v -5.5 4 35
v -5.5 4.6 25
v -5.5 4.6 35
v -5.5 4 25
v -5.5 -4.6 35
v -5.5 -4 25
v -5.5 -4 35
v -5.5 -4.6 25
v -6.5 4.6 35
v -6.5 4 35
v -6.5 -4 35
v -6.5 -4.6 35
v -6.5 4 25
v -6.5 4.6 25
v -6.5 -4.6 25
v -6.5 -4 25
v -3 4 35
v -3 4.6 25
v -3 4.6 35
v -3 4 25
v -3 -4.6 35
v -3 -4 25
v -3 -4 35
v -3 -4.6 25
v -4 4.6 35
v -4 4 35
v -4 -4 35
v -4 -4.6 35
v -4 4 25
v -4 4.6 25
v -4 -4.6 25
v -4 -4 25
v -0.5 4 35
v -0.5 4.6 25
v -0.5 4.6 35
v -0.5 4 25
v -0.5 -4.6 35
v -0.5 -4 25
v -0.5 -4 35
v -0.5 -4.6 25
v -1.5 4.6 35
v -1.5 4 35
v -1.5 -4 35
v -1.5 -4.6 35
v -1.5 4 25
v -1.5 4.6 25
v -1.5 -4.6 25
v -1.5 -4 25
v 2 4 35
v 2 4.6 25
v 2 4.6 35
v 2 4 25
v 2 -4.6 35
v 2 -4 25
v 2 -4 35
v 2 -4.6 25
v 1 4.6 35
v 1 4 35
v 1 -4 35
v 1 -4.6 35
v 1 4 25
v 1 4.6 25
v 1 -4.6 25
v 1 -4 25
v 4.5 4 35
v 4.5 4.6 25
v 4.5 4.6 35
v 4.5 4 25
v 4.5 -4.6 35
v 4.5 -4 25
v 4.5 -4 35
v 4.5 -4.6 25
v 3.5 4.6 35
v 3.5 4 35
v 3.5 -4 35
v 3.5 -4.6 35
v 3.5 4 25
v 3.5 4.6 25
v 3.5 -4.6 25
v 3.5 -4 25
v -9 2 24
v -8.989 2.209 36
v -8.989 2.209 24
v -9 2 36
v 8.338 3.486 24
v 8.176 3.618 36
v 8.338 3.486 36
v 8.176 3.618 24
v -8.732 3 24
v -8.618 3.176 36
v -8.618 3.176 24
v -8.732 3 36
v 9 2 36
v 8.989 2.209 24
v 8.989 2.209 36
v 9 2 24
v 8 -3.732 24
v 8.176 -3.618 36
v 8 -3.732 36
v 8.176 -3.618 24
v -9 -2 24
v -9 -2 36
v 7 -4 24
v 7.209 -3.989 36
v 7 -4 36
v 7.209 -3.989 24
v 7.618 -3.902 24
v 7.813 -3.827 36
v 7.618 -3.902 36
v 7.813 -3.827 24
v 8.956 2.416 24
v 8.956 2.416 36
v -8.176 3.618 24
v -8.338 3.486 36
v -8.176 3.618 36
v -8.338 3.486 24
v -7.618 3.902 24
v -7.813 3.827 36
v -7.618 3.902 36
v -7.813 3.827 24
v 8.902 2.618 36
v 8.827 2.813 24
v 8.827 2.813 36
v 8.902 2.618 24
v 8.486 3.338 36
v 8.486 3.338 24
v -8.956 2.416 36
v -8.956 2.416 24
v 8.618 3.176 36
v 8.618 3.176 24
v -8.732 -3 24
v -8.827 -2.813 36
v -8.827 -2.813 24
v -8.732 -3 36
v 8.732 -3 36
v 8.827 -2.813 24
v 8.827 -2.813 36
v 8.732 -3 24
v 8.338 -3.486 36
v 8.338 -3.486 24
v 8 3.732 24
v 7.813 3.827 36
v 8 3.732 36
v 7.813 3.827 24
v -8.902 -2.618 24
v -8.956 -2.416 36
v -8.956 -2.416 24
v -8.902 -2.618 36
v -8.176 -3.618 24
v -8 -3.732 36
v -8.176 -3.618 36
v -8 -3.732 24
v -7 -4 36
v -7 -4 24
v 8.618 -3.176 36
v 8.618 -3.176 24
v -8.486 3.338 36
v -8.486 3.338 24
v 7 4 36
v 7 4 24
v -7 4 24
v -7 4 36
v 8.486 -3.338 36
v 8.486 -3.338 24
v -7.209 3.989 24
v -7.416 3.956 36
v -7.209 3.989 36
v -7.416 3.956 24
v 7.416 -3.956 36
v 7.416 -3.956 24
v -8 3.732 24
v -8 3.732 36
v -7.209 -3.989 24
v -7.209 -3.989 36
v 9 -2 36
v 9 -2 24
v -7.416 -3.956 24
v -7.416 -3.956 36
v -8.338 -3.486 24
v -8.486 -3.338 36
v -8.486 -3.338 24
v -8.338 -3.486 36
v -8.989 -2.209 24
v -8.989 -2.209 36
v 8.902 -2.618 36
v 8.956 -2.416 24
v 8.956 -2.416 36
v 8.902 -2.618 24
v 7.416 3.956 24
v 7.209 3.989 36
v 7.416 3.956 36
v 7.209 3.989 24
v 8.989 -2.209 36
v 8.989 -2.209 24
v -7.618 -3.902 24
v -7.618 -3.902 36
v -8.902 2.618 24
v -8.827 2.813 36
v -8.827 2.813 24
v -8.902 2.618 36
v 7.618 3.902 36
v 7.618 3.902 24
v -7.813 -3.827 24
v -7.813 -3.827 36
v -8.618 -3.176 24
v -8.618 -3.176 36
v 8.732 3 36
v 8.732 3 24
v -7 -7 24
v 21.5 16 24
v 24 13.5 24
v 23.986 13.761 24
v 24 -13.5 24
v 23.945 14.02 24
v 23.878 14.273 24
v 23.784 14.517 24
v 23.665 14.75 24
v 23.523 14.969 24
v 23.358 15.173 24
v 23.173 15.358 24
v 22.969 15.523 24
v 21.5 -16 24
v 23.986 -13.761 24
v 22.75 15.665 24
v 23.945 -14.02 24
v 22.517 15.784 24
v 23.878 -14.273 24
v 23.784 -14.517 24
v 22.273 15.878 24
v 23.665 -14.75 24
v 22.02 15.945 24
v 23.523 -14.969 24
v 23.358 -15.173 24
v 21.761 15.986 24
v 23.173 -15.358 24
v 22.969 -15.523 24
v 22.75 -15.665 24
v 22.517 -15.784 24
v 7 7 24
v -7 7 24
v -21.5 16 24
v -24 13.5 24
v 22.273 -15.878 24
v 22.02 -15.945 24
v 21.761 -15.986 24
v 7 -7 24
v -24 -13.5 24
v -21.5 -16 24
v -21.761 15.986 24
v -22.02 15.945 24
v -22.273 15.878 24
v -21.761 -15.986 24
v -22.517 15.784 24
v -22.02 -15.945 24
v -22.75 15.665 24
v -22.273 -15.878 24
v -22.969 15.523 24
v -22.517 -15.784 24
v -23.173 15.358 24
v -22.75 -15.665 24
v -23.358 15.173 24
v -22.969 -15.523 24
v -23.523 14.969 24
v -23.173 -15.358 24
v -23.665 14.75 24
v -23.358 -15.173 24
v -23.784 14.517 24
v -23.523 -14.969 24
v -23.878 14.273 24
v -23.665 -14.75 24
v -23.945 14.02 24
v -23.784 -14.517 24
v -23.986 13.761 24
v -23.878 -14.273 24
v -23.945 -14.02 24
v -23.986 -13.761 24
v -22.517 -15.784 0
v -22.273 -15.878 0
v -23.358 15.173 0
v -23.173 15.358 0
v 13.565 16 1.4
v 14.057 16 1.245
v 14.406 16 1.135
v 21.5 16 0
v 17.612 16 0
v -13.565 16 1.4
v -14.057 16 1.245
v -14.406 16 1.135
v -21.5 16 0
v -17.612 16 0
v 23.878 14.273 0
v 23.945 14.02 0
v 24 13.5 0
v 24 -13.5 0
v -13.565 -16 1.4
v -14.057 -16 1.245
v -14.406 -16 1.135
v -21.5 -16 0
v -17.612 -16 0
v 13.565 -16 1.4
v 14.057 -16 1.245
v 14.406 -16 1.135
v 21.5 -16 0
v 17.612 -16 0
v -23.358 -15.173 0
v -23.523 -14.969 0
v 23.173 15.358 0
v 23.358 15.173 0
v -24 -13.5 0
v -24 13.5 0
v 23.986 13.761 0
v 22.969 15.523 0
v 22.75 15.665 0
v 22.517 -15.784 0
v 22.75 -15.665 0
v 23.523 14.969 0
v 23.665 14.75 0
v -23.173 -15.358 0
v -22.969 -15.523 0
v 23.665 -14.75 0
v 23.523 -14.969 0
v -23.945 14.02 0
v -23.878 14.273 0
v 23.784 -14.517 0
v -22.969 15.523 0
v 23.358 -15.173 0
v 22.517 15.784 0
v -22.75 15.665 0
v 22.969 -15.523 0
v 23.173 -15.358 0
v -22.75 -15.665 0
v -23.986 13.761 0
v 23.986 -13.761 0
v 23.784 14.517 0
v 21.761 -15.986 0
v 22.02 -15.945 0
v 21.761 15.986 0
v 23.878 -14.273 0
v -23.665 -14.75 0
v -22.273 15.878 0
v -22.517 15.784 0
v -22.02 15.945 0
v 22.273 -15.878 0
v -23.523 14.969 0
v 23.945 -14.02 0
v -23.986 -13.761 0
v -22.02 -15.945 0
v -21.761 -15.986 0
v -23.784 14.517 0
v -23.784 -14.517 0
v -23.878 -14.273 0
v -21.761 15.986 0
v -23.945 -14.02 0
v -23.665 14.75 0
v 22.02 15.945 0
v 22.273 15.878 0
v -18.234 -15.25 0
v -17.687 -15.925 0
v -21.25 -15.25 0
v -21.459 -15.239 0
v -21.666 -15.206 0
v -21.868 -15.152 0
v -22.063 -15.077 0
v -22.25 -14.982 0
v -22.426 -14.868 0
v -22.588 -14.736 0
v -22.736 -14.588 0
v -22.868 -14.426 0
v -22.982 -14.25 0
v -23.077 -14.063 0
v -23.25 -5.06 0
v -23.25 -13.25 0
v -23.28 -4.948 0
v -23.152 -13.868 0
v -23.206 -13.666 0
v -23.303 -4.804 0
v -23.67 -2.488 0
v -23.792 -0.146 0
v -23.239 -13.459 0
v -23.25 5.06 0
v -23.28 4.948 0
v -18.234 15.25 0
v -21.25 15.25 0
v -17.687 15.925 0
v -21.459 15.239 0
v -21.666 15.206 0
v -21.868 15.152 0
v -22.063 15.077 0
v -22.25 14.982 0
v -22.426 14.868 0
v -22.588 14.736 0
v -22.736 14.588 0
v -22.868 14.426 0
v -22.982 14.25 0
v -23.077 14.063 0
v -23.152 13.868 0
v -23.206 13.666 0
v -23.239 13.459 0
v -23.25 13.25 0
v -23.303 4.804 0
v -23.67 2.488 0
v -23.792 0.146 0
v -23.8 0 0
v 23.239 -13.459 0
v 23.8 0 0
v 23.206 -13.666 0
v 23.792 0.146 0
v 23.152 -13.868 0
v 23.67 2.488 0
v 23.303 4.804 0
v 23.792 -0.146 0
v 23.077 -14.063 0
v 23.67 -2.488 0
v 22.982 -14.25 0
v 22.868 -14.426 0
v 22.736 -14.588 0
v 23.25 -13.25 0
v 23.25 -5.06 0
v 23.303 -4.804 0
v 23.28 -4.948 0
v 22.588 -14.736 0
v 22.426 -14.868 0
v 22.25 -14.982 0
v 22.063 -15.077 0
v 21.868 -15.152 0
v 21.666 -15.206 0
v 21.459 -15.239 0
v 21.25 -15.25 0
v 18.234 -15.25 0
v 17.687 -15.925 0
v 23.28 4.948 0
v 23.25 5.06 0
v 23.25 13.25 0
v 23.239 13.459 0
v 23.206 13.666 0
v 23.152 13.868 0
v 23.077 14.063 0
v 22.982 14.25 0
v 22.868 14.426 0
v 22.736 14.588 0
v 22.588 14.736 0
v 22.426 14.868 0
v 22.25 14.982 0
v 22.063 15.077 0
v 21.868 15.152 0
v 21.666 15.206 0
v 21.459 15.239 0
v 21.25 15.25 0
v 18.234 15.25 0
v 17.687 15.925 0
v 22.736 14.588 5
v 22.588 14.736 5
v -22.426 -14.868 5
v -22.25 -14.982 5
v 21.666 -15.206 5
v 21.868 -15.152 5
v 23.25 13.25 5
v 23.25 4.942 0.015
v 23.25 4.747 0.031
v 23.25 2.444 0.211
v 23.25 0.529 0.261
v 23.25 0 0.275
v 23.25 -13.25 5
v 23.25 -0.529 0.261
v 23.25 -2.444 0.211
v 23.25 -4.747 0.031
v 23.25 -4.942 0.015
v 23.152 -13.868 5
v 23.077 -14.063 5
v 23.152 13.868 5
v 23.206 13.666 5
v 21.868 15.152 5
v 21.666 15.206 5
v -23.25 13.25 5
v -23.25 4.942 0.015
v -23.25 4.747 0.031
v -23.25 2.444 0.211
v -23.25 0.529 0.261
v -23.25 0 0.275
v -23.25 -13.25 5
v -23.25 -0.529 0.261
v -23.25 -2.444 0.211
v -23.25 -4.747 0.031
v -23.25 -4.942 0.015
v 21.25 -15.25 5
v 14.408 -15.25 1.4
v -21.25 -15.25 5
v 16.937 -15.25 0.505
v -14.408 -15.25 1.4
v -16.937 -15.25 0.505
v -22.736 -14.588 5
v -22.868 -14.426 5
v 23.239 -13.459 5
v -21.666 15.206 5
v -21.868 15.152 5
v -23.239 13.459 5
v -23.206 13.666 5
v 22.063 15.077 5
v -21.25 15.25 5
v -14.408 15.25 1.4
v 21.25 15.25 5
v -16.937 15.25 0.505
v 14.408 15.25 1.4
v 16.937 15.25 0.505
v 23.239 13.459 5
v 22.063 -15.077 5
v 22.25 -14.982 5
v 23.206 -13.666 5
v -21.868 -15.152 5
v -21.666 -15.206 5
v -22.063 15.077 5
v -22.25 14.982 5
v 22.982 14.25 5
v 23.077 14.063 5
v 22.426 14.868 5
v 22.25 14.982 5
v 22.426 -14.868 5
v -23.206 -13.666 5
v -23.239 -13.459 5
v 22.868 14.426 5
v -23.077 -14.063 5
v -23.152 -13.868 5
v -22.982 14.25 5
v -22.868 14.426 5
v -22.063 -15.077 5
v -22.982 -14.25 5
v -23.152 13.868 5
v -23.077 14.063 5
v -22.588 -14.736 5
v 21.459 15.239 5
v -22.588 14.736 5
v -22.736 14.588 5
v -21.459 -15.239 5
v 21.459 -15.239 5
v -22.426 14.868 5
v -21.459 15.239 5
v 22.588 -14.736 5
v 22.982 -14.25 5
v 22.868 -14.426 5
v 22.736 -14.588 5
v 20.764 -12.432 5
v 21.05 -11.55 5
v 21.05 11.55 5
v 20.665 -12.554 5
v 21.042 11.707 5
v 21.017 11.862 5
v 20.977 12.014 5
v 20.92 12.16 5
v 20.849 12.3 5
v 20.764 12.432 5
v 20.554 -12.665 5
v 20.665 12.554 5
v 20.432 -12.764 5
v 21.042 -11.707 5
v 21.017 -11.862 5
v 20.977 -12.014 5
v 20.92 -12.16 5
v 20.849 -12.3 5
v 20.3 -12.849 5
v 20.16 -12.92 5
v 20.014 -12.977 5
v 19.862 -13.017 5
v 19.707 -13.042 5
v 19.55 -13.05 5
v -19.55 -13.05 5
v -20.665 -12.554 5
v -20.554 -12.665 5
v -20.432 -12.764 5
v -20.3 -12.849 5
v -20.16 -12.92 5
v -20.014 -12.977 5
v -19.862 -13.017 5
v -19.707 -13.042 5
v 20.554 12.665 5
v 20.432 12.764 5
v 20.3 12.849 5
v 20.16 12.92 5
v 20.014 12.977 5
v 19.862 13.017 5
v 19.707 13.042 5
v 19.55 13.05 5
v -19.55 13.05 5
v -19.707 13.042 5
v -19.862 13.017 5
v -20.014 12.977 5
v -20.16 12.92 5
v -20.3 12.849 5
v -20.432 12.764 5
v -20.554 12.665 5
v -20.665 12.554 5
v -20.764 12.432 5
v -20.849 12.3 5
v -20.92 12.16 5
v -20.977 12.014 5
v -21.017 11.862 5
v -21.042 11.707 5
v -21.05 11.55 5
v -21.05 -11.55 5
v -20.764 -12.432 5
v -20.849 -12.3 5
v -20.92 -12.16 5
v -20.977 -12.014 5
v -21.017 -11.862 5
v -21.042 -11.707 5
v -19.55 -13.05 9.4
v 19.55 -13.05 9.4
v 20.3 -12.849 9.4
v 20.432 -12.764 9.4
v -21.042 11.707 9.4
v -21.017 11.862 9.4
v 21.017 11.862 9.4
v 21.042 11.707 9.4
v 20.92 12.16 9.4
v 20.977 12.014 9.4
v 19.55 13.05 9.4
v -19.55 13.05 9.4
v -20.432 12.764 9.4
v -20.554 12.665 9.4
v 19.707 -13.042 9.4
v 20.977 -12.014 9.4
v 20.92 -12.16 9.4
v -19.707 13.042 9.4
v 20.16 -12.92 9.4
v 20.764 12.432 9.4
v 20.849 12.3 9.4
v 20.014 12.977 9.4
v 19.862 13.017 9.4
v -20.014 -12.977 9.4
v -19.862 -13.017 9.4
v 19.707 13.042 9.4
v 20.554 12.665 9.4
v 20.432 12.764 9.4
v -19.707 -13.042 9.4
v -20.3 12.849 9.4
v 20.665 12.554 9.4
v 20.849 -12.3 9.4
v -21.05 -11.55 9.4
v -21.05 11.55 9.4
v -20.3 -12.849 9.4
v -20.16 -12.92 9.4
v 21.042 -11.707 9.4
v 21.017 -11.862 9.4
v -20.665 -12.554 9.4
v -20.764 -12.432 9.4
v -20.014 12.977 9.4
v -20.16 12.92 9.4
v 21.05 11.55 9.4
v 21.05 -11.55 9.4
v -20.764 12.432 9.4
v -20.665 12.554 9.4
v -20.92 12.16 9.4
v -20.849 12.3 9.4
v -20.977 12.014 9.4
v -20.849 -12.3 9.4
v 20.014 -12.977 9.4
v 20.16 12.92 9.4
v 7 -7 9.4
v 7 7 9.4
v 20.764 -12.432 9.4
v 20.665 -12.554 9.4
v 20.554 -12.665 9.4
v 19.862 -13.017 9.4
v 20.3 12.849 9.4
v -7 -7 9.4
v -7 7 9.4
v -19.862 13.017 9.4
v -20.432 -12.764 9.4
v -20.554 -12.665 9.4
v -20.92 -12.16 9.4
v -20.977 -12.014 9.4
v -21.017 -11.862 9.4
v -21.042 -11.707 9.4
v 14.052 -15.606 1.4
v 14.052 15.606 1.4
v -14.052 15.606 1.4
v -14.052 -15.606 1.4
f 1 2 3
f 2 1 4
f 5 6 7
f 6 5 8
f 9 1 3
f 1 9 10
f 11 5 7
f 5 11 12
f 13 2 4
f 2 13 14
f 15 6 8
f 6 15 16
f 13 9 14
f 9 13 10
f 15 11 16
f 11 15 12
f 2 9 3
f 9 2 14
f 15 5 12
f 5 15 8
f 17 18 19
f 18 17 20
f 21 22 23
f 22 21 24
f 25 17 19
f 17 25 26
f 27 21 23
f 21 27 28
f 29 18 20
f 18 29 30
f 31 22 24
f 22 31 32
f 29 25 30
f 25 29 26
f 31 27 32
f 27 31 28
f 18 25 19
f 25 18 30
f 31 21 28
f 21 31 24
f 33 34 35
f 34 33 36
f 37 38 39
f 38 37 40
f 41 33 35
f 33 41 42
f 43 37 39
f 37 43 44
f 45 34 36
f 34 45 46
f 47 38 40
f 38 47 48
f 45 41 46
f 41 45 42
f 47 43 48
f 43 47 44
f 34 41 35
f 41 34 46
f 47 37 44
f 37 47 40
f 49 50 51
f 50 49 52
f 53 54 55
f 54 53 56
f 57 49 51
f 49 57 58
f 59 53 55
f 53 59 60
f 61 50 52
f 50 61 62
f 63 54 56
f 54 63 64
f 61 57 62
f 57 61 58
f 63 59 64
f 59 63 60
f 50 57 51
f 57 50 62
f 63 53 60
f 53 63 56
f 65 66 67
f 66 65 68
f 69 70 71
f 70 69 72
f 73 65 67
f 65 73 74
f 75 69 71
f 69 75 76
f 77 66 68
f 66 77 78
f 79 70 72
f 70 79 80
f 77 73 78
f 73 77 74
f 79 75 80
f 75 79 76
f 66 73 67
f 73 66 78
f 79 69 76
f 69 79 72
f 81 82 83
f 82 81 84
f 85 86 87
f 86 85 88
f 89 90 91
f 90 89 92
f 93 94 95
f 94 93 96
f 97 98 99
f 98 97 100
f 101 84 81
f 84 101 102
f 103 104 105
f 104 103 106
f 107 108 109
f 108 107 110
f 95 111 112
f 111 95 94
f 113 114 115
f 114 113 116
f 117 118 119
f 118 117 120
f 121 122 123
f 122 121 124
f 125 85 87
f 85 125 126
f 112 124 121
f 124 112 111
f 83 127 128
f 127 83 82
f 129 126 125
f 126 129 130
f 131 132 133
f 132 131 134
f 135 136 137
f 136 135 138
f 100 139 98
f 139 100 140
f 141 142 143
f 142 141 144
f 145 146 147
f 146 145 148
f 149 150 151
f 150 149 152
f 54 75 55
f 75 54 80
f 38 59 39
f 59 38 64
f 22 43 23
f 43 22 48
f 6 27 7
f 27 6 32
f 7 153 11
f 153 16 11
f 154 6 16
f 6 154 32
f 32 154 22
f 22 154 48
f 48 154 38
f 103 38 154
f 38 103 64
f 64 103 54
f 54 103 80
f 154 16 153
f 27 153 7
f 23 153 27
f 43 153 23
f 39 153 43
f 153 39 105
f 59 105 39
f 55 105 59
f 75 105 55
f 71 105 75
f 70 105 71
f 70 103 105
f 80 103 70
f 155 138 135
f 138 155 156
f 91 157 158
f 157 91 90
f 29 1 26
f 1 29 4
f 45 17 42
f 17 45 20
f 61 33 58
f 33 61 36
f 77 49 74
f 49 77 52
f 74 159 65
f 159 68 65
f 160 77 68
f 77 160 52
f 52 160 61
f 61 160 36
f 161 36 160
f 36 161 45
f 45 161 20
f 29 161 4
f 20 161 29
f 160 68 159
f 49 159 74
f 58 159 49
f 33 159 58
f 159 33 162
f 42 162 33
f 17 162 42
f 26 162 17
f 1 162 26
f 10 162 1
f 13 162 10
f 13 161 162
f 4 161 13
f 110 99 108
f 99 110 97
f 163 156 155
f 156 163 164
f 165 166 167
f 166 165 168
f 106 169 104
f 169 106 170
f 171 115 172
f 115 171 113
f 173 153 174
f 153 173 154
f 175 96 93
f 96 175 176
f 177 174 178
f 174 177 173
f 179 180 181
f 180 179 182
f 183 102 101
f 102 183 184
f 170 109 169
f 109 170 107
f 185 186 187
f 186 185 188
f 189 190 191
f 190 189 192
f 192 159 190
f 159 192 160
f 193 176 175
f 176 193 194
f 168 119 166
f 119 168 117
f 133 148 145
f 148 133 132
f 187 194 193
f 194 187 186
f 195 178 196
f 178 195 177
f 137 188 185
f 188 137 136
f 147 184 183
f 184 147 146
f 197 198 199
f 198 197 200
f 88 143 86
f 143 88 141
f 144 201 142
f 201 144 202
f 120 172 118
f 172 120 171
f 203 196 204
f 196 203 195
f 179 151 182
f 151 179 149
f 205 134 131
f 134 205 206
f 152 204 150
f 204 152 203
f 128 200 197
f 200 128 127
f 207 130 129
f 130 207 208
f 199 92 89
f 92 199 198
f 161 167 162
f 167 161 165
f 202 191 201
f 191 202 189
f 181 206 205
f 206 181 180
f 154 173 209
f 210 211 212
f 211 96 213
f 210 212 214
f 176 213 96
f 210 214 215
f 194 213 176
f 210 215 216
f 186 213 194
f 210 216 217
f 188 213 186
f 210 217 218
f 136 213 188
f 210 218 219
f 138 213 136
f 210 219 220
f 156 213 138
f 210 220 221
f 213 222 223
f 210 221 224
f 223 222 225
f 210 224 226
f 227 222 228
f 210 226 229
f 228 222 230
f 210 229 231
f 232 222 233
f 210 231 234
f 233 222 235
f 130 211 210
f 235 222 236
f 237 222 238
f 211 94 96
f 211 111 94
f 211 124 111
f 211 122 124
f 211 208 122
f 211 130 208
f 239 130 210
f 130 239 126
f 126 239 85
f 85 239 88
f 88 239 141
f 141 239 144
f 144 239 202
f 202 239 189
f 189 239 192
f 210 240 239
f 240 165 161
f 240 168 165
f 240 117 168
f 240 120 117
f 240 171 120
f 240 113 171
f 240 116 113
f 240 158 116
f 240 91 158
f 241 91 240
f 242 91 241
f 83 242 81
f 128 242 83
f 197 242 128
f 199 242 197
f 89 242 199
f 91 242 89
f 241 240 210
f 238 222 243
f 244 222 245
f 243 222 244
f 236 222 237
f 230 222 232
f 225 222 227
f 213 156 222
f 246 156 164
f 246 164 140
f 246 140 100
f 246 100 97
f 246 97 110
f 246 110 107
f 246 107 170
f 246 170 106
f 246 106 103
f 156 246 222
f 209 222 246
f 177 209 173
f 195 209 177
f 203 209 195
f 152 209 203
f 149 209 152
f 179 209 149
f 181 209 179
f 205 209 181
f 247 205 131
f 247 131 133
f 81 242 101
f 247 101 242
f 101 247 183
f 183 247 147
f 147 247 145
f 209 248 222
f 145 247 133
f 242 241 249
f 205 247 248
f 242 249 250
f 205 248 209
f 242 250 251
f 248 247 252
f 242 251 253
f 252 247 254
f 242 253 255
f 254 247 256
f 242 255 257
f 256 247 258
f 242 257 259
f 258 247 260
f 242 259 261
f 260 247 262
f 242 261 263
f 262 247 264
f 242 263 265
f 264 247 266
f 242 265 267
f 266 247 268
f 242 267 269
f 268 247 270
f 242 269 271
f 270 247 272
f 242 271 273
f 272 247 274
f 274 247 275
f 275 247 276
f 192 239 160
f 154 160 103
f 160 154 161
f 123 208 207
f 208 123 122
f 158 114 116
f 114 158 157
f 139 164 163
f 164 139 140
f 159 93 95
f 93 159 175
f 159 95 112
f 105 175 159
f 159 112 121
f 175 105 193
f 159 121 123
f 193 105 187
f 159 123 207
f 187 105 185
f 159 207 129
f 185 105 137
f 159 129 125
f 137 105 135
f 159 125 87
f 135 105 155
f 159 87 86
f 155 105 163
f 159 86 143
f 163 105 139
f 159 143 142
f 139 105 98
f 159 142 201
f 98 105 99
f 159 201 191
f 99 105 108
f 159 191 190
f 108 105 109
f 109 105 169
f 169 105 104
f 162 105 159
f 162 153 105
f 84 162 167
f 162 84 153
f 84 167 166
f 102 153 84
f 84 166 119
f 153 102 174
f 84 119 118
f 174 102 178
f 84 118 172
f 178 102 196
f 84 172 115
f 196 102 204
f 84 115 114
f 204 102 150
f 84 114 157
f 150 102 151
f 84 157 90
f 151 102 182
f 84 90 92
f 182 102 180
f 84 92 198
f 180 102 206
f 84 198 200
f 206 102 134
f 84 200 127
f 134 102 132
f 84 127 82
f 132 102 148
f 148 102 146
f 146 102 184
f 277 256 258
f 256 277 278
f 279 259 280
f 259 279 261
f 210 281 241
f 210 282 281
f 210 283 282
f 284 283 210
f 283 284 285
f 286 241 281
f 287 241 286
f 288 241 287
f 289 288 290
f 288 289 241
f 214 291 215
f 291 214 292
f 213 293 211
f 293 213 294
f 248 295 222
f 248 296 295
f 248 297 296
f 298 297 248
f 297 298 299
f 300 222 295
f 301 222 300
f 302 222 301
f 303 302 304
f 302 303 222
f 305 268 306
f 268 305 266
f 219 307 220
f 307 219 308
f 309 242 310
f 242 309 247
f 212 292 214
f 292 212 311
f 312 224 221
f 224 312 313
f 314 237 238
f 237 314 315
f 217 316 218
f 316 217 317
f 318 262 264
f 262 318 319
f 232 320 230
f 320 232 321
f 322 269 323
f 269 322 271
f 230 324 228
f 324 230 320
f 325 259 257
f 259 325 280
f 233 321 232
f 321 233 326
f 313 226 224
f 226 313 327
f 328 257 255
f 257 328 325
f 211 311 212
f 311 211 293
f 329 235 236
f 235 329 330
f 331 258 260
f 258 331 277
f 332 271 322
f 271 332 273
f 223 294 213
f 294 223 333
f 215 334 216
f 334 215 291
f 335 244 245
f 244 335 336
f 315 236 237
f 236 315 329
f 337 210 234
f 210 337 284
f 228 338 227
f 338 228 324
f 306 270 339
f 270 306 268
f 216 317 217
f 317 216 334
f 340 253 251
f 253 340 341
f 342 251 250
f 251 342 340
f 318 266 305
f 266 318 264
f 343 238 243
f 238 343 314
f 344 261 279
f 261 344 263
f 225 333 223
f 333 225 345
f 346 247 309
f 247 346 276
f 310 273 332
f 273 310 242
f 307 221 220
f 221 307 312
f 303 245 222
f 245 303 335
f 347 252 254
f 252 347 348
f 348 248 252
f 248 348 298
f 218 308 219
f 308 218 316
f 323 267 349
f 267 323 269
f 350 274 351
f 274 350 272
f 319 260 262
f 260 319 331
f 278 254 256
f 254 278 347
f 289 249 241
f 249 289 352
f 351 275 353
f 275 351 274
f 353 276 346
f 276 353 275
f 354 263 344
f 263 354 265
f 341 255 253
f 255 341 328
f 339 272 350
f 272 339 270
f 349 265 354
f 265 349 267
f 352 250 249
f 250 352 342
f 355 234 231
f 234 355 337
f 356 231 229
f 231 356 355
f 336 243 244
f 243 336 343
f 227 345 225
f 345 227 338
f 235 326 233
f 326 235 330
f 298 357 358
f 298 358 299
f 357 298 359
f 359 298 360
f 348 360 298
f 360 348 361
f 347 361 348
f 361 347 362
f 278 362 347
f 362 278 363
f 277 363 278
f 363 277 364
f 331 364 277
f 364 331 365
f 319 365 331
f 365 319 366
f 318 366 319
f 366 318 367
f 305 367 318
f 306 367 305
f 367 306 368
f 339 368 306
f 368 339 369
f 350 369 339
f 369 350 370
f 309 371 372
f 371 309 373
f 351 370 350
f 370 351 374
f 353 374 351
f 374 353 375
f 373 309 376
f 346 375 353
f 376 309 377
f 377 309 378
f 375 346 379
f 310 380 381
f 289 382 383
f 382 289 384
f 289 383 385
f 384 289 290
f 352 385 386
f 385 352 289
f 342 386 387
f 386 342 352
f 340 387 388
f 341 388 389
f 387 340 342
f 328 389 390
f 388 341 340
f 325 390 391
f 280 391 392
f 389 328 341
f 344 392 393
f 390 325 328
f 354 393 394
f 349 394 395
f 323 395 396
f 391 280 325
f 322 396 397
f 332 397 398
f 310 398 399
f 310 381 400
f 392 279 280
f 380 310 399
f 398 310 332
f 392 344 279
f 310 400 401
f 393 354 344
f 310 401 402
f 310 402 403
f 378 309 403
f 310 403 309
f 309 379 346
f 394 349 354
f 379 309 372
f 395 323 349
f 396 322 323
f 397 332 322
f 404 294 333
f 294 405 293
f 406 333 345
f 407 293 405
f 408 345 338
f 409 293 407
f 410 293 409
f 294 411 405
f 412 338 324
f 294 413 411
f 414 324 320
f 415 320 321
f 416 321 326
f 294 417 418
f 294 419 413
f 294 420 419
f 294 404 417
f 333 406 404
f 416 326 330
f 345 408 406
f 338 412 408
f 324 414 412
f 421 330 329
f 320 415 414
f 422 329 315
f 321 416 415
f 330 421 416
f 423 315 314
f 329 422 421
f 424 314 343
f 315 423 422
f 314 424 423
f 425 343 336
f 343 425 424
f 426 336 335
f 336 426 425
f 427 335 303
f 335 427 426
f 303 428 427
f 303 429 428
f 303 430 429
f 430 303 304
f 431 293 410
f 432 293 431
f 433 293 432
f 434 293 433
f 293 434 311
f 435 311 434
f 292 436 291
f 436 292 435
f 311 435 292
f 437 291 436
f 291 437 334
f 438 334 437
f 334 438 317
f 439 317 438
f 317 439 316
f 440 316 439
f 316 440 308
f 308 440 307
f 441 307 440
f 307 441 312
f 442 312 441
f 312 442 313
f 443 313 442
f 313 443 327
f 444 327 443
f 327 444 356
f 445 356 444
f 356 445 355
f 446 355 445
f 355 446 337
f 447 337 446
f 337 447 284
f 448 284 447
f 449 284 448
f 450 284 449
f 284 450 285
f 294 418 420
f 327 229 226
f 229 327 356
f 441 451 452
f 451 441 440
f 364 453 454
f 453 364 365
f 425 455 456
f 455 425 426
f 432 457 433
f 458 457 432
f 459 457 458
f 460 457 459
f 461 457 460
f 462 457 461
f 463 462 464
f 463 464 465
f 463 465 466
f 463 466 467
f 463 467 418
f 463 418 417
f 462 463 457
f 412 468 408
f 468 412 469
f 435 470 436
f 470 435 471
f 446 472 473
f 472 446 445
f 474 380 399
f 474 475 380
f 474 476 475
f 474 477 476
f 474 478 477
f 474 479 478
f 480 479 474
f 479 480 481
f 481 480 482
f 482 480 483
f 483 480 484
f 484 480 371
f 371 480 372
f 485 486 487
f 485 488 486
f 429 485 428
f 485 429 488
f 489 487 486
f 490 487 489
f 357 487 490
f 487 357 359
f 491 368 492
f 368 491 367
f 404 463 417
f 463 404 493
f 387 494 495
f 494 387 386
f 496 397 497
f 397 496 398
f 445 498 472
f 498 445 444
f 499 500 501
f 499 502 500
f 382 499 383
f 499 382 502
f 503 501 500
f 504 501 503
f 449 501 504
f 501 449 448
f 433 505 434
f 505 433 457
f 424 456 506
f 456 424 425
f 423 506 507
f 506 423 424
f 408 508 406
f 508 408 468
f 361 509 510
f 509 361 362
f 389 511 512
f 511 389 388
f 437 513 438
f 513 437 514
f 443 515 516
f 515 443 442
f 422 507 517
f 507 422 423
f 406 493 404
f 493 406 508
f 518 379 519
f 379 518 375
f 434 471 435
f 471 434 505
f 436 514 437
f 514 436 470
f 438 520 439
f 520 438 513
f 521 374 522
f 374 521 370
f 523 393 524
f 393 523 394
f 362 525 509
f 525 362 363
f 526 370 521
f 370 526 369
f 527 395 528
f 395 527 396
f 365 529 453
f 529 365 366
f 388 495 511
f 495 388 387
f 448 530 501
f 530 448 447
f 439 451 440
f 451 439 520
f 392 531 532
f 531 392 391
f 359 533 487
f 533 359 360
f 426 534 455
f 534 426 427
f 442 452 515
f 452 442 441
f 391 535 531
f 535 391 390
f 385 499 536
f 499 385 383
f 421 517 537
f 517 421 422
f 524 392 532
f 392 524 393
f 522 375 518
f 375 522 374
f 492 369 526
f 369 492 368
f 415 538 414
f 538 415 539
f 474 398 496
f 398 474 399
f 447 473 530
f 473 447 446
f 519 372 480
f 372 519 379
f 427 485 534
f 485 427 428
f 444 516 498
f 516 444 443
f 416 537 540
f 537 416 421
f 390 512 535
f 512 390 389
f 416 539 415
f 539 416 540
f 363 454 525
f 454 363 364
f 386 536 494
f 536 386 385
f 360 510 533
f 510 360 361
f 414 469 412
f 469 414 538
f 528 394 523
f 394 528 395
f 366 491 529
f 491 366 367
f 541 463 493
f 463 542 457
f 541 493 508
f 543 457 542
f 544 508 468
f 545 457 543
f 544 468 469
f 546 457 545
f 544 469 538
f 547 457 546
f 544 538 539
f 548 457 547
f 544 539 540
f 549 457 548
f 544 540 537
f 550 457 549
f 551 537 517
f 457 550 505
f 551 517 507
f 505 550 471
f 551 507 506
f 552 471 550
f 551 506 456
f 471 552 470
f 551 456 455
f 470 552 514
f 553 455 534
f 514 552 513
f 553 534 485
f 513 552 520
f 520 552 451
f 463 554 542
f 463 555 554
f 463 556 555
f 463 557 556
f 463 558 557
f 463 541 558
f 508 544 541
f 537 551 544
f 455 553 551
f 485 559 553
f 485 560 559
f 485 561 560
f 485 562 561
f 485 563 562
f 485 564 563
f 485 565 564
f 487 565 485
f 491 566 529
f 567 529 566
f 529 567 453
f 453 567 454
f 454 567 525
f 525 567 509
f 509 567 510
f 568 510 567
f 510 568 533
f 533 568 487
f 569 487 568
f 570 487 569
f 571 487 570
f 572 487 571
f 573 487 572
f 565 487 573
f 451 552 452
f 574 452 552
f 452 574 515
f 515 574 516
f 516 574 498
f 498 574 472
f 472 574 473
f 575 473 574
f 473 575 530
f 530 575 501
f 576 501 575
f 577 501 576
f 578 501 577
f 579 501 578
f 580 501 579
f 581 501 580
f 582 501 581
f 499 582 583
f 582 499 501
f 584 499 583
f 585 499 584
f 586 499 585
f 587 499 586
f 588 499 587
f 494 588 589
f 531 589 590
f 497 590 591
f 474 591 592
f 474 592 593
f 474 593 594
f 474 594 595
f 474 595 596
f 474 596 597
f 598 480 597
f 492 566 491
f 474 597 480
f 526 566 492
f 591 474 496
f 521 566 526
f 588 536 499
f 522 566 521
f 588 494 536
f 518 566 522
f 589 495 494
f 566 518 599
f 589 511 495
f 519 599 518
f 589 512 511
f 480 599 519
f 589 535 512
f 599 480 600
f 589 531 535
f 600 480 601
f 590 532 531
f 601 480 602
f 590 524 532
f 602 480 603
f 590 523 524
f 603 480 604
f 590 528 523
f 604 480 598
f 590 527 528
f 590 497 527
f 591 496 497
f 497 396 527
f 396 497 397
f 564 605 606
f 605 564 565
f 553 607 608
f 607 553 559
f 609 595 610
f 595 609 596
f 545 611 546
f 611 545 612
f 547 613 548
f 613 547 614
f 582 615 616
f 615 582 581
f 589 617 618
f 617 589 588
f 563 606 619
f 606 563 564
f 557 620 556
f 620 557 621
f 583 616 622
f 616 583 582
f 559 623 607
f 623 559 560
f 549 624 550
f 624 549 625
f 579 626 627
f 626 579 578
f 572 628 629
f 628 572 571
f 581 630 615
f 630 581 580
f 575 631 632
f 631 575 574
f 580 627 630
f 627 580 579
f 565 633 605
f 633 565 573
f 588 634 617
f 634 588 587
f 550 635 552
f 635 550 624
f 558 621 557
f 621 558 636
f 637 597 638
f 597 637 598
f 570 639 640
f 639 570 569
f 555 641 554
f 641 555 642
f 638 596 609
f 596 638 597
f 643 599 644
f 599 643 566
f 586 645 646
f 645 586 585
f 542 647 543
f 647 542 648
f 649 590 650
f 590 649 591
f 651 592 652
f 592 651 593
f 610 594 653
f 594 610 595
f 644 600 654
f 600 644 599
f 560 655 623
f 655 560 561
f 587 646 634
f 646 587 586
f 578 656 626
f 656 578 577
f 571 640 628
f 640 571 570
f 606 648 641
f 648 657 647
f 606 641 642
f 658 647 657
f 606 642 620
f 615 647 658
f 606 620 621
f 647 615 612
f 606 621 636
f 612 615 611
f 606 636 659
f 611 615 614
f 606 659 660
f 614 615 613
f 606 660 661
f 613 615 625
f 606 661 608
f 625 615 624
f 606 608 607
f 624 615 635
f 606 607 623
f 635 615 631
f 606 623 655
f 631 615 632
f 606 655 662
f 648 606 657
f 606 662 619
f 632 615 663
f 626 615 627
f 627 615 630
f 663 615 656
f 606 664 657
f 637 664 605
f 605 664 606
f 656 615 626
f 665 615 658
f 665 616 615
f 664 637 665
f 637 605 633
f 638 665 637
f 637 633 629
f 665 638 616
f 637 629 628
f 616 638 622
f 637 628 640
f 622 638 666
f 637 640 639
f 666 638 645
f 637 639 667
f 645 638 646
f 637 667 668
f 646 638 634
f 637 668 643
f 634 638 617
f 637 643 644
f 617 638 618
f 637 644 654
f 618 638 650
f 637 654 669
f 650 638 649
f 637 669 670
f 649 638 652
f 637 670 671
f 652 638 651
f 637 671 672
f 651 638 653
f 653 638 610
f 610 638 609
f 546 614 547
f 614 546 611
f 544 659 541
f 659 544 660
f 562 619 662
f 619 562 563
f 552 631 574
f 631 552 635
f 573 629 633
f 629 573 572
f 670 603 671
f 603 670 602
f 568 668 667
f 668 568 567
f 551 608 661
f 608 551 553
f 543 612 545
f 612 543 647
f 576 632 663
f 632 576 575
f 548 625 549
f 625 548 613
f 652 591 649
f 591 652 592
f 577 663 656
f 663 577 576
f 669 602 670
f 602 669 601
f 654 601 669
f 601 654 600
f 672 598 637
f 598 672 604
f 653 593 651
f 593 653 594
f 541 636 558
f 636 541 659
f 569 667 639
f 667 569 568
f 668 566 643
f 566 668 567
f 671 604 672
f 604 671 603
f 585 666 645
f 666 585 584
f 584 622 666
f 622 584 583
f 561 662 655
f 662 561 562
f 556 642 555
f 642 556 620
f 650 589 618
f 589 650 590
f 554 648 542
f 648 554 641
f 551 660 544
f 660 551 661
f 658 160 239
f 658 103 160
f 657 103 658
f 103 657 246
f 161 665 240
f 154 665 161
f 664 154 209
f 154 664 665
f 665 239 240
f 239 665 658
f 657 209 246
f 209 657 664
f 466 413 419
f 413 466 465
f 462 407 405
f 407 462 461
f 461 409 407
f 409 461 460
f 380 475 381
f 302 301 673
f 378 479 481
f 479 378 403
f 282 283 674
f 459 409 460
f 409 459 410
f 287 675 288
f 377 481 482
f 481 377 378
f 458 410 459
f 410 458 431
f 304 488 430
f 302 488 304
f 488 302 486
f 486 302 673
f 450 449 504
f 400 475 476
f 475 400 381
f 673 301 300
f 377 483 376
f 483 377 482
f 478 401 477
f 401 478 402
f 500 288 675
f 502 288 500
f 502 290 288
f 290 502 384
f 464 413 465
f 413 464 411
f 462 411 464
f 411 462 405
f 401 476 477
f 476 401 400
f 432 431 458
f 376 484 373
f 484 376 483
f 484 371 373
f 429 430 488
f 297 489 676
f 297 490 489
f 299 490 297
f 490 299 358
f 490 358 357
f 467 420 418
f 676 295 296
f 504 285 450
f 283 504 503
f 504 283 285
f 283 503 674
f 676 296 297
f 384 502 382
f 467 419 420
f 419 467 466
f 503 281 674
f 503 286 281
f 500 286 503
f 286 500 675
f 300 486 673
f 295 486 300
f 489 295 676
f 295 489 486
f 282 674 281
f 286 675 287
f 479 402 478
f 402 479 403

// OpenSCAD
// ==============================================================================
// NPK Spectrometer 2026 - Light-Tight Labyrinth Baffle Lid
// Digital Agriphysics & AI Research Unit (JC_AI_SciRBRU)
// Department of Physics, Faculty of Science and Technology,
// Rambhai Barni Rajabhat University (RBRU)
//
// Features:
// 1. Dual-stepped labyrinth seal (Baffle Joint) completely blocks ambient light
// 2. Internal headroom accommodates cuvette top without physical pressure
// 3. Ergonomic ribbed grip handle for one-handed operation during field assays
// 4. Chamfered leading edges for smooth mating with chamber rim
// ==============================================================================

$fn = 60; // Curve resolution

// --- Global Parametric Dimensions ---
tolerance              = 0.25;  // 3D printing clearance (mm)

// Chamber mating dimensions
body_w                 = 46.00; 
body_d                 = 30.00;
baffle_step_w          = 2.20;  // Shoulder step width on chamber
baffle_h               = 3.50;  // Height of chamber baffle lip

// Lid dimensions
lid_w                  = body_w + 2.0; // 48.0 mm
lid_d                  = body_d + 2.0; // 32.0 mm
lid_skirt_overlap      = 5.00;         // Depth skirt goes down around chamber
lid_roof_th            = 3.50;         // Thickness of lid top roof
lid_total_h            = lid_skirt_overlap + baffle_h + 12.00 + lid_roof_th; // 24.0 mm

// Internal Cuvette Clearance Cavity
cuvette_pocket_w       = 14.00;        // Clearance for 12.5mm cuvette
cuvette_pocket_d       = 14.00;
cuvette_pocket_h       = baffle_h + 12.00; // 15.5 mm headroom

// Handle Dimensions
handle_w               = 18.00;
handle_d               = 8.00;
handle_h               = 12.00;

// ==============================================================================
// Main Lid Module
// ==============================================================================
module light_tight_lid() {
    difference() {
        // --- 1. POSITIVE SOLID BODY ---
        union() {
            // Main Outer Lid Shell (Rounded Box)
            hull() {
                translate([-lid_w/2 + 2.5, -lid_d/2 + 2.5, 0]) cylinder(r=2.5, h=lid_total_h);
                translate([ lid_w/2 - 2.5, -lid_d/2 + 2.5, 0]) cylinder(r=2.5, h=lid_total_h);
                translate([ lid_w/2 - 2.5,  lid_d/2 - 2.5, 0]) cylinder(r=2.5, h=lid_total_h);
                translate([-lid_w/2 + 2.5,  lid_d/2 - 2.5, 0]) cylinder(r=2.5, h=lid_total_h);
            }

            // Top Ergonomic Grip Handle with Textured Ribs
            translate([0, 0, lid_total_h]) {
                hull() {
                    translate([-handle_w/2 + 2, -handle_d/2 + 2, 0]) cylinder(r=2, h=handle_h);
                    translate([ handle_w/2 - 2, -handle_d/2 + 2, 0]) cylinder(r=2, h=handle_h);
                    translate([ handle_w/2 - 2,  handle_d/2 - 2, 0]) cylinder(r=2, h=handle_h);
                    translate([-handle_w/2 + 2,  handle_d/2 - 2, 0]) cylinder(r=2, h=handle_h);
                }
                
                // Grip texture ribs
                for (i = [-handle_w/2 + 3 : 2.5 : handle_w/2 - 3]) {
                    translate([i, 0, handle_h/2])
                        cube([1.0, handle_d + 1.2, handle_h - 2], center=true);
                }
            }
        }

        // --- 2. NEGATIVE LABYRINTH CAVITIES ---
        
        // 2.1 Outer Skirt Recess (Fits over chamber body outer perimeter)
        translate([0, 0, -0.1]) {
            hull() {
                translate([-(body_w/2 + tolerance) + 2, -(body_d/2 + tolerance) + 2, 0])
                    cylinder(r=2, h=lid_skirt_overlap + 0.1);
                translate([ (body_w/2 + tolerance) - 2, -(body_d/2 + tolerance) + 2, 0])
                    cylinder(r=2, h=lid_skirt_overlap + 0.1);
                translate([ (body_w/2 + tolerance) - 2,  (body_d/2 + tolerance) - 2, 0])
                    cylinder(r=2, h=lid_skirt_overlap + 0.1);
                translate([-(body_w/2 + tolerance) + 2,  (body_d/2 + tolerance) - 2, 0])
                    cylinder(r=2, h=lid_skirt_overlap + 0.1);
            }
        }

        // 2.2 Stepped Inner Labyrinth Groove (Fits over raised baffle lip)
        inner_lip_w = body_w - (2 * baffle_step_w) + (2 * tolerance);
        inner_lip_d = body_d - (2 * baffle_step_w) + (2 * tolerance);
        
        translate([0, 0, lid_skirt_overlap - 0.1]) {
            hull() {
                translate([-inner_lip_w/2 + 1.5, -inner_lip_d/2 + 1.5, 0])
                    cylinder(r=1.5, h=baffle_h + 1.0);
                translate([ inner_lip_w/2 - 1.5, -inner_lip_d/2 + 1.5, 0])
                    cylinder(r=1.5, h=baffle_h + 1.0);
                translate([ inner_lip_w/2 - 1.5,  inner_lip_d/2 - 1.5, 0])
                    cylinder(r=1.5, h=baffle_h + 1.0);
                translate([-inner_lip_w/2 + 1.5,  inner_lip_d/2 - 1.5, 0])
                    cylinder(r=1.5, h=baffle_h + 1.0);
            }
        }

        // 2.3 Center Cuvette Headroom Pocket
        translate([-cuvette_pocket_w/2, -cuvette_pocket_d/2, lid_skirt_overlap + baffle_h])
            cube([cuvette_pocket_w, cuvette_pocket_d, cuvette_pocket_h]);

        // Entry chamfer for smooth sliding
        translate([0, 0, -0.1])
            cylinder(r1=body_w/2 + 1, r2=body_w/2 - 2, h=1.5);
    }
}

// Render the lid (oriented in printing position with skirt opening down)
light_tight_lid();
